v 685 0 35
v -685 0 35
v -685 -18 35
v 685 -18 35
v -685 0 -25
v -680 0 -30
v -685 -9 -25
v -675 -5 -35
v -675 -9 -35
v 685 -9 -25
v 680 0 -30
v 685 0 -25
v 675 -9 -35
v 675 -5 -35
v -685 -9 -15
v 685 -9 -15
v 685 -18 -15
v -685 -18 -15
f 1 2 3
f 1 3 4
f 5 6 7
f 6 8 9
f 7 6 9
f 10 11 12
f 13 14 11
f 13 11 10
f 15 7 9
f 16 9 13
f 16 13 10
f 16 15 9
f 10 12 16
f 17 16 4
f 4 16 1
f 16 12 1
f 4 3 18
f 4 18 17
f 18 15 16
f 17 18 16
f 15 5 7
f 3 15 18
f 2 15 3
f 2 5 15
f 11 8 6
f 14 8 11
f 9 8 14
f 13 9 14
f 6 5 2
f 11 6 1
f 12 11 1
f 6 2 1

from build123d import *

# Parameters (mm, degrees)
F0_W     = 1370
F0_H     = 70
F1_DEPTH = 9
F2_W     = 1370
F2_H     = 50
F3_DEPTH = 9
F4_SIZE  = 10
F5_SIZE  = 5


with BuildPart() as f1:
    # F0 (on Front) → F1 (new body)
    with BuildSketch(Plane.XZ):
        Rectangle(F0_W, F0_H)
    extrude(amount=F1_DEPTH)

    # F2 (on face) → F3 (join)
    with BuildSketch(Plane.XZ.offset(9)):
        with Locations((0, 10)):
            Rectangle(F2_W, F2_H)
    extrude(amount=F3_DEPTH)

    # F4
    f4_edges = [f1.edges().sort_by_distance(p)[0] for p in [
        (685, -4.5, -35),
        (-685, -4.5, -35),
    ]]
    chamfer(f4_edges, length=F4_SIZE)

    # F5
    f5_edges = [f1.edges().sort_by_distance(p)[0] for p in [
        (0, 0, -35),
    ]]
    chamfer(f5_edges, length=F5_SIZE)


solid = f1.part
